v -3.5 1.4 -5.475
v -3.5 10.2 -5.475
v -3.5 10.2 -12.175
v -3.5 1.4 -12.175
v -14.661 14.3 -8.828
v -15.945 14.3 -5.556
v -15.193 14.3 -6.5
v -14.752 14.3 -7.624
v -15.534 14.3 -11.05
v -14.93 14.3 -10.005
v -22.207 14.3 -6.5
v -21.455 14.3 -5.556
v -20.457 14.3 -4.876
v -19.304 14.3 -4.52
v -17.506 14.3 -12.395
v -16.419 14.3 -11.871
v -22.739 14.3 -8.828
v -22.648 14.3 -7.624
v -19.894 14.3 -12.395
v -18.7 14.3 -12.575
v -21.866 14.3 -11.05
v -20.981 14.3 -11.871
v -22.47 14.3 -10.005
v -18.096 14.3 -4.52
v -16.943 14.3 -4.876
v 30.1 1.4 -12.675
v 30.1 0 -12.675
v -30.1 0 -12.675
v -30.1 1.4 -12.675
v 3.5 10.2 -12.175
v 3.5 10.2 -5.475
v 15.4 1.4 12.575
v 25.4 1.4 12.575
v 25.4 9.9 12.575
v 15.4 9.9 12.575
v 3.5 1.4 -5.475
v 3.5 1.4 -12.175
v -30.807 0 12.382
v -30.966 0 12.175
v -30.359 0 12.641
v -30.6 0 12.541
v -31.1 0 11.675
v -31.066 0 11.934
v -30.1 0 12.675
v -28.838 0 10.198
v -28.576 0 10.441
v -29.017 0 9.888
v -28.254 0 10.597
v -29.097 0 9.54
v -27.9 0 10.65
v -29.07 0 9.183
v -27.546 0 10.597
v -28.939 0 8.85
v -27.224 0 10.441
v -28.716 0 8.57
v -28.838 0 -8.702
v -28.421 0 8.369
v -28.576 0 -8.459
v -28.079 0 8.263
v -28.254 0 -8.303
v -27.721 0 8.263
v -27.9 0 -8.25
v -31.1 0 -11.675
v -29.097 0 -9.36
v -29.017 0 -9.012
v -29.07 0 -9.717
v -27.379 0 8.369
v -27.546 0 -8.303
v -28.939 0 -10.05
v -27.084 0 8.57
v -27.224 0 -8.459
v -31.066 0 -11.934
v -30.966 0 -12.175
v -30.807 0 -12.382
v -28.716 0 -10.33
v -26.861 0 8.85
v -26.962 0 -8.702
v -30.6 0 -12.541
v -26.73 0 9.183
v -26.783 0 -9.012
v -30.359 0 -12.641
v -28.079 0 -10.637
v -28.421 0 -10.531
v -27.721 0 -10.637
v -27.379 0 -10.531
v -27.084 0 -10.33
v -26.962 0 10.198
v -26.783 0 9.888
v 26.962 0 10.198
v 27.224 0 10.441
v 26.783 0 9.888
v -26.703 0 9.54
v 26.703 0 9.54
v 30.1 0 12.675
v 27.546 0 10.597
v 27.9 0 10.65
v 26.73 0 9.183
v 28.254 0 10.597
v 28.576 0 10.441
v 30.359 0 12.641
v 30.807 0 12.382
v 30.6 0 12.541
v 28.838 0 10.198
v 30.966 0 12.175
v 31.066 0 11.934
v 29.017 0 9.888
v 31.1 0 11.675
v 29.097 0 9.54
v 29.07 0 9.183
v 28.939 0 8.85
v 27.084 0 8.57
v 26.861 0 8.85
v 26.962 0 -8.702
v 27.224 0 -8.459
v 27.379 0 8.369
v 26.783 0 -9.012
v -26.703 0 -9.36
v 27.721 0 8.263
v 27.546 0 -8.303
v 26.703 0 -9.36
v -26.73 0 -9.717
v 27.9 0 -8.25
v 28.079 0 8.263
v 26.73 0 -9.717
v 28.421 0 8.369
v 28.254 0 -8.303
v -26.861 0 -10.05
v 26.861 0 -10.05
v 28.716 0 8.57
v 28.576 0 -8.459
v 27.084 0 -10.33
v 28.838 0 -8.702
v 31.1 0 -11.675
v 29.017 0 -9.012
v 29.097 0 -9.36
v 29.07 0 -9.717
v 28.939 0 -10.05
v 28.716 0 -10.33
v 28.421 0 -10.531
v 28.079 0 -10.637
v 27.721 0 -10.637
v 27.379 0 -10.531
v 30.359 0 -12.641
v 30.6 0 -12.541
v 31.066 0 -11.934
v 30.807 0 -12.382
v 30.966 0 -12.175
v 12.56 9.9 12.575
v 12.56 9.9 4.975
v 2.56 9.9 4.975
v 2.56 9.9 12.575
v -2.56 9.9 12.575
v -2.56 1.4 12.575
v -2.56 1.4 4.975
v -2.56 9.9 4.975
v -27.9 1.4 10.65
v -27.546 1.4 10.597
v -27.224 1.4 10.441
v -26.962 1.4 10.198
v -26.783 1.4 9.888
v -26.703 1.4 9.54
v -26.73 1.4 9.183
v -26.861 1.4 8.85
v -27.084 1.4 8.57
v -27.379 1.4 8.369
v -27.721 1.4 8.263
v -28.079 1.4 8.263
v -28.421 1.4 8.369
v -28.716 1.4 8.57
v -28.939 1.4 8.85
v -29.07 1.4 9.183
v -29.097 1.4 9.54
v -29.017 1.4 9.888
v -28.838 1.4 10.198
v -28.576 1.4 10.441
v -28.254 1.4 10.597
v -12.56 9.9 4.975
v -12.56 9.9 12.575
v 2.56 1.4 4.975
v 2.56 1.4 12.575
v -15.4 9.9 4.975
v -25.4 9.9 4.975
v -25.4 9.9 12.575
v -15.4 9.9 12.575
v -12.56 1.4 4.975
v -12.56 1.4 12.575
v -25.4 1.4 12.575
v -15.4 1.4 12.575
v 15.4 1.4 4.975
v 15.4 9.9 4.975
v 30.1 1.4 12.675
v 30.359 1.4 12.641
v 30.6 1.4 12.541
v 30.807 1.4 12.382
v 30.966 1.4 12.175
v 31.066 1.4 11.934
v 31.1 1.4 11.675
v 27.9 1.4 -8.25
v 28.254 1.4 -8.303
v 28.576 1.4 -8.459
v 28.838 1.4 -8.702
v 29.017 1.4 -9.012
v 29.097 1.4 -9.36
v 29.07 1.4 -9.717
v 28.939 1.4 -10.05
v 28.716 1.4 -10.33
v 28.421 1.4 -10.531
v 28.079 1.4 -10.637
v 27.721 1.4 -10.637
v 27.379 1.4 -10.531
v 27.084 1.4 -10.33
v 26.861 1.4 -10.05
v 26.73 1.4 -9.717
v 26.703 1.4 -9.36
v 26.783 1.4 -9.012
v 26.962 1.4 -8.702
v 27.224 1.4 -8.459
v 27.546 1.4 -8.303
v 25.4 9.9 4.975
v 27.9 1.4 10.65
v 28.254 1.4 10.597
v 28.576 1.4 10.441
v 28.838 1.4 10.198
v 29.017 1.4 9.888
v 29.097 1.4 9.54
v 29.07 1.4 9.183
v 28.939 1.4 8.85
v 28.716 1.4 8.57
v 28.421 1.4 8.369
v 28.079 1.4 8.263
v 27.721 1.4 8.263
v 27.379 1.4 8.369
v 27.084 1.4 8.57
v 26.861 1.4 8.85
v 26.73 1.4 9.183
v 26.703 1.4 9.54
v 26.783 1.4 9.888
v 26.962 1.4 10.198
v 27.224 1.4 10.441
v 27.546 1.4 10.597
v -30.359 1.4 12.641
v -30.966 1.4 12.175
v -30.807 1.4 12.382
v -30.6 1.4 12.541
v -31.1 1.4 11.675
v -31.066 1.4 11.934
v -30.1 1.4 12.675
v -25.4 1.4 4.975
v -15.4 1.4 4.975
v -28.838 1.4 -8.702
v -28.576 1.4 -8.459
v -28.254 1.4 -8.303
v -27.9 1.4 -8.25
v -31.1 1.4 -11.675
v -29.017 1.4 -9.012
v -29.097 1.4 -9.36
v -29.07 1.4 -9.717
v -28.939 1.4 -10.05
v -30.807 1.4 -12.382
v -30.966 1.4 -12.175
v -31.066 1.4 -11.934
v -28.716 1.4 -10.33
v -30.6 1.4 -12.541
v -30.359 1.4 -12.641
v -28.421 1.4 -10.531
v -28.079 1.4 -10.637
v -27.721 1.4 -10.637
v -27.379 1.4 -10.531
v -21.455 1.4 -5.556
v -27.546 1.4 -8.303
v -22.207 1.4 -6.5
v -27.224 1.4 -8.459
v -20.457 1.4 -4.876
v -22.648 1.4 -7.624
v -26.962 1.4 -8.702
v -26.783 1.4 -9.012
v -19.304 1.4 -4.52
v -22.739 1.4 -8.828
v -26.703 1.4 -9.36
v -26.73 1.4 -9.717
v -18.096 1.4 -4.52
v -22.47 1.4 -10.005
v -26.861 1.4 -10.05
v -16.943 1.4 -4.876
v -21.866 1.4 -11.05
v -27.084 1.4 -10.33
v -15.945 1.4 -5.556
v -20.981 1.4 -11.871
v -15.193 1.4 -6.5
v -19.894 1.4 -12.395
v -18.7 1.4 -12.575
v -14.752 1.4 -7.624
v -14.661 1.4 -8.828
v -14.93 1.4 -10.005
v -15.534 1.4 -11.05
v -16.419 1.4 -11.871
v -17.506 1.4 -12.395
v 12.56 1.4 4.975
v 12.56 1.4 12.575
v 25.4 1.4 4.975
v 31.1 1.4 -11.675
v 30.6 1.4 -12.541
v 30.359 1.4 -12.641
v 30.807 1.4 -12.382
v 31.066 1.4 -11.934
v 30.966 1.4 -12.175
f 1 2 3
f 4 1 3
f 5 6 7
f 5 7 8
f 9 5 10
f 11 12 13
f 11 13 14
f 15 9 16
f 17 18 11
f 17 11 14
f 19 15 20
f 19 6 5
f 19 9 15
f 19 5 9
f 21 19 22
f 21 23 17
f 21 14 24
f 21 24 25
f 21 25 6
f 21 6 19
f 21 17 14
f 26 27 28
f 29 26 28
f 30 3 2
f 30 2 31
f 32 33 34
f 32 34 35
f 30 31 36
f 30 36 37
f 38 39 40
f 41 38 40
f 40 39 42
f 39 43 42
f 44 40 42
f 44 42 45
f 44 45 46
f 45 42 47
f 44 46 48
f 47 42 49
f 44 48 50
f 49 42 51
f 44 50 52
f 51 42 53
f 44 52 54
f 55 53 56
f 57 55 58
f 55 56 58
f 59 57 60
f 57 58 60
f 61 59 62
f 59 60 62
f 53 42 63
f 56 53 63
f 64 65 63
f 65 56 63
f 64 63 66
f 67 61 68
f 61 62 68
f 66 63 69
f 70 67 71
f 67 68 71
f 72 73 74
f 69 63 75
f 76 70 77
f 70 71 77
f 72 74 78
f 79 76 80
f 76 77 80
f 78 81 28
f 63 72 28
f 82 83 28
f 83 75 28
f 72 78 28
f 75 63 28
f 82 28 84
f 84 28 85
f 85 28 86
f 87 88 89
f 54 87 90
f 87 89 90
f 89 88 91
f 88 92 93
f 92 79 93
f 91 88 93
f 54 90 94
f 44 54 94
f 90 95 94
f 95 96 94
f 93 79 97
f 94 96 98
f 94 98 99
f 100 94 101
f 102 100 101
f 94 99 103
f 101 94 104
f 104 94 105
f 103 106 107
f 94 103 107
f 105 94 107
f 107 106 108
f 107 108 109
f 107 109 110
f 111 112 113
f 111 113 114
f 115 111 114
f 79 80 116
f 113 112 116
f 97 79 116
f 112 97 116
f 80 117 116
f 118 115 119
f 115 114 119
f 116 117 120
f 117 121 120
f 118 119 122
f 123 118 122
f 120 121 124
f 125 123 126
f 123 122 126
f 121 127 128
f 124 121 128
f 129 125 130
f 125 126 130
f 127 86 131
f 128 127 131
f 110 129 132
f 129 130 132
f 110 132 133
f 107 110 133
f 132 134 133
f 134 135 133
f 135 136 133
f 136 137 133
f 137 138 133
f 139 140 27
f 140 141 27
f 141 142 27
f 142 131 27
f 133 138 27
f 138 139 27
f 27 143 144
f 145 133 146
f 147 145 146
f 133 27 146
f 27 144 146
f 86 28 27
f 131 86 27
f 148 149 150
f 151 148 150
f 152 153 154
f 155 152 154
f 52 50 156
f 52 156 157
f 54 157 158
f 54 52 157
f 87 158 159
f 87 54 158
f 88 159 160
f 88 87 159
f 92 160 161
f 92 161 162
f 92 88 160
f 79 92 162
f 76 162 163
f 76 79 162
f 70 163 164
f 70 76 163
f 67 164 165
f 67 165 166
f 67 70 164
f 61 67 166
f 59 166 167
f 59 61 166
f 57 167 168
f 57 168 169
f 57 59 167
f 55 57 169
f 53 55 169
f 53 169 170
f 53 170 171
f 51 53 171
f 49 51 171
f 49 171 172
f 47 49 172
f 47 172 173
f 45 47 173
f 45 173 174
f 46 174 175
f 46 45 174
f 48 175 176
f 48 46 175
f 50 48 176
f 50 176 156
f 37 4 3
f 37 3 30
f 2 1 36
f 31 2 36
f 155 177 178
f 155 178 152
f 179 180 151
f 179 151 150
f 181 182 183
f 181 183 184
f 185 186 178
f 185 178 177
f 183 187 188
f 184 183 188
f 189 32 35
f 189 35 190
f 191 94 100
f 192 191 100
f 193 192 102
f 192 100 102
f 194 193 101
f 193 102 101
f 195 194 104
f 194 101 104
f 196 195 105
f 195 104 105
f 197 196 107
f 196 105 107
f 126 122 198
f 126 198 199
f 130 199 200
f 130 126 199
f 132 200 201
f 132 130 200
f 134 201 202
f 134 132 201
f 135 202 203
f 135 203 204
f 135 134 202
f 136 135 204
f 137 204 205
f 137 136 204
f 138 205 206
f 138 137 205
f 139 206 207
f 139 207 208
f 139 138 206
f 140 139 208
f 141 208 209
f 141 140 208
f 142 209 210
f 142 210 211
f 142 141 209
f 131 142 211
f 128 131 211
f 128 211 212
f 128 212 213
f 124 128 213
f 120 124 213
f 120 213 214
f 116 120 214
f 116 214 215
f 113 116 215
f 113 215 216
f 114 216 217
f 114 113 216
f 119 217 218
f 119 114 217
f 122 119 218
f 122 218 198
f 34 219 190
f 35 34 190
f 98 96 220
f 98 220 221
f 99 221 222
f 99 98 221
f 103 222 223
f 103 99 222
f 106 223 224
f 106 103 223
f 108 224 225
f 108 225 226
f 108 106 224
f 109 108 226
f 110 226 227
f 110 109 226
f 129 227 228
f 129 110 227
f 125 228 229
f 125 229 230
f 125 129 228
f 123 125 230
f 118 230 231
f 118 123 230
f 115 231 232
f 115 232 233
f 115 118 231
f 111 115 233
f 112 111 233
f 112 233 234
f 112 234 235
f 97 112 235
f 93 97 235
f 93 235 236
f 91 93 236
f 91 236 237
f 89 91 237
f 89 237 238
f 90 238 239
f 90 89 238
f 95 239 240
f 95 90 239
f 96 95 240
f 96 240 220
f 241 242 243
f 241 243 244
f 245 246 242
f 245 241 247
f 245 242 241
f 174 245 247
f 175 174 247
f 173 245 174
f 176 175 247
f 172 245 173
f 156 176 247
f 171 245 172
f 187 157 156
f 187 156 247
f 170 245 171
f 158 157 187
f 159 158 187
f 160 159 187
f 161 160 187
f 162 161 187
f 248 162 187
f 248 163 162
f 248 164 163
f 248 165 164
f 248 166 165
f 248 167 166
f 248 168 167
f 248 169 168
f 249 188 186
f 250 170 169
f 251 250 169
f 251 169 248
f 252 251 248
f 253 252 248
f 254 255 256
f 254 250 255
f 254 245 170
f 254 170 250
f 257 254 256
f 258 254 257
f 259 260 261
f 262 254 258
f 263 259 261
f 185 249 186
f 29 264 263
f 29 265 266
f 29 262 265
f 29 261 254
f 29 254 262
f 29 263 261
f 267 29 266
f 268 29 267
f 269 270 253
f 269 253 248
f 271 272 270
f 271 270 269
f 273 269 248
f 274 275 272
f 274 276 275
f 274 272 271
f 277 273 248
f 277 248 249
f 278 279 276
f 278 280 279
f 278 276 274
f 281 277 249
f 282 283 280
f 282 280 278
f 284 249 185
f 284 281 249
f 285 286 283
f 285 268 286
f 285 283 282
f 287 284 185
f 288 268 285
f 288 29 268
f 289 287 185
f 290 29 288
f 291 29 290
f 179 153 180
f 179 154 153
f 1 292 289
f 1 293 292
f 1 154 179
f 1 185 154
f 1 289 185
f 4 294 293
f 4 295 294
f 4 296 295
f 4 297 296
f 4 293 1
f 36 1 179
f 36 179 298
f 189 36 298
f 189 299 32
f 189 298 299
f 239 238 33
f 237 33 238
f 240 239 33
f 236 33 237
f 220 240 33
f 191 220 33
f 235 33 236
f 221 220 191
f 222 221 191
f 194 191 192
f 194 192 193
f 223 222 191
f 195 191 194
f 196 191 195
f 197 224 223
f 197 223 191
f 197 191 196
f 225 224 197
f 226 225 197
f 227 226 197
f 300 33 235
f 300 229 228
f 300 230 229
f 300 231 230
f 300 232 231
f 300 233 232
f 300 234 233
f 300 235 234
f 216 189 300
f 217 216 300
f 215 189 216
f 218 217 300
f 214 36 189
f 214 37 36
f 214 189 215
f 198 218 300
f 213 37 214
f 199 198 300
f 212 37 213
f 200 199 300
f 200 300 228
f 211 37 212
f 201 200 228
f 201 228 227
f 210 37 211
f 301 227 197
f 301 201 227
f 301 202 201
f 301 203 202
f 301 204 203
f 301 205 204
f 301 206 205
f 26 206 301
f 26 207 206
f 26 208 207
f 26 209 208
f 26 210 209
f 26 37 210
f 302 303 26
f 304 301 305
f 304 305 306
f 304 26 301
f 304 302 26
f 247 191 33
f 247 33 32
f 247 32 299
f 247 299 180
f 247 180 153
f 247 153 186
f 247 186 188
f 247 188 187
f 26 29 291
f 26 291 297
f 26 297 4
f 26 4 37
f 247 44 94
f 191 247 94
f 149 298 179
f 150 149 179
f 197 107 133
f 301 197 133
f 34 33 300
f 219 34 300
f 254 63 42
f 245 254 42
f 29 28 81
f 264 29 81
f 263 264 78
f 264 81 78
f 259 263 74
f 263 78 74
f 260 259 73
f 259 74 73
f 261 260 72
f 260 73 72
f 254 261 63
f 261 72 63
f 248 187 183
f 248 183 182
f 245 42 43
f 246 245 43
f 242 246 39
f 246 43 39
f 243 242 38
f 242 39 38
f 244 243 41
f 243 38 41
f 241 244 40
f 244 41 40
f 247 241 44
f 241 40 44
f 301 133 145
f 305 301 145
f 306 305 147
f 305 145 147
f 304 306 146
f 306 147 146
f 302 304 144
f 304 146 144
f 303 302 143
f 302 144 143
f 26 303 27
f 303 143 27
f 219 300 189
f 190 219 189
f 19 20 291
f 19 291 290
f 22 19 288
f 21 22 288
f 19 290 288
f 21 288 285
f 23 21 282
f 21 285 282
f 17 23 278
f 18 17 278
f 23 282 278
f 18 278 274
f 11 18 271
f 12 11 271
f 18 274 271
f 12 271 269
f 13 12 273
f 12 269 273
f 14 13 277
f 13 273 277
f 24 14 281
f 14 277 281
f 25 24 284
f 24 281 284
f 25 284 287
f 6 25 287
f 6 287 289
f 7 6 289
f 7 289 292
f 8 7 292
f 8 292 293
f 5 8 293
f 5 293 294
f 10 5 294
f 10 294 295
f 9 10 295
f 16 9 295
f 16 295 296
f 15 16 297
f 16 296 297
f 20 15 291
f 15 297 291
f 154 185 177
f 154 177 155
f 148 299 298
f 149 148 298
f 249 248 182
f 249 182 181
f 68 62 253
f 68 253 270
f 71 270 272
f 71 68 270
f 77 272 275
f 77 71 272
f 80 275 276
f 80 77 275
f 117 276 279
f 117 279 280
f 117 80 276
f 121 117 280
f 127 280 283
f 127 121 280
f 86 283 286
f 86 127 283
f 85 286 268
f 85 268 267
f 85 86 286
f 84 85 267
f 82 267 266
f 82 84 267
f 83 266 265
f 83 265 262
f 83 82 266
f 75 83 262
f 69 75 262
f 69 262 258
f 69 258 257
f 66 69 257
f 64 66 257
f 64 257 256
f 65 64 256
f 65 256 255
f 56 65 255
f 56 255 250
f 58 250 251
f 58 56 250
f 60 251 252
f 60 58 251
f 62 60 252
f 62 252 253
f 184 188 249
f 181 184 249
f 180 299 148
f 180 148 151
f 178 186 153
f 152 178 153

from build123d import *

# Parameters (mm, degrees)
SKETCH1_R           = 1.2
BOSS_EXTRUDE1_DEPTH = 1.4
SKETCH2_W           = 7
SKETCH2_H           = 6.7
BOSS_EXTRUDE2_DEPTH = 8.8
SKETCH3_W           = 10
SKETCH3_H           = 7.6
BOSS_EXTRUDE3_DEPTH = 8.5
SKETCH4_R           = 4.05
BOSS_EXTRUDE4_DEPTH = 12.9


with BuildPart() as part:
    # Sketch1 → Boss-Extrude1 (new body)
    with BuildSketch(Plane(origin=(0, 0, 0), x_dir=(1, 0, 0), z_dir=(0, 1, 0))):
        with BuildLine():
            Line((-30.1, -12.675), (30.1, -12.675))
            ThreePointArc((30.1, -12.675), (30.807106781, -12.382106781), (31.1, -11.675))
            Line((31.1, -11.675), (31.1, 11.675))
            ThreePointArc((31.1, 11.675), (30.807106781, 12.382106781), (30.1, 12.675))
            Line((30.1, 12.675), (-30.1, 12.675))
            ThreePointArc((-30.1, 12.675), (-30.807106781, 12.382106781), (-31.1, 11.675))
            Line((-31.1, 11.675), (-31.1, -11.675))
            ThreePointArc((-31.1, -11.675), (-30.807106781, -12.382106781), (-30.1, -12.675))
        make_face()
        with Locations(Location((-27.9, 9.45, 0), (0, 0, 270))):
            Circle(SKETCH1_R, mode=Mode.SUBTRACT)
        with Locations(Location((-27.9, -9.45, 0), (0, 0, 270))):
            Circle(SKETCH1_R, mode=Mode.SUBTRACT)
        with Locations(Location((27.9, -9.45, 0), (0, 0, 270))):
            Circle(SKETCH1_R, mode=Mode.SUBTRACT)
        with Locations(Location((27.9, 9.45, 0), (0, 0, 270))):
            Circle(SKETCH1_R, mode=Mode.SUBTRACT)
    extrude(amount=BOSS_EXTRUDE1_DEPTH)

    # Sketch2 → Boss-Extrude2 (add)
    with BuildSketch(Plane(origin=(0, 1.4, 0), x_dir=(1, 0, 0), z_dir=(0, 1, 0))):
        with Locations((0, 8.825)):
            Rectangle(SKETCH2_W, SKETCH2_H)
    extrude(amount=BOSS_EXTRUDE2_DEPTH)

    # Sketch3 → Boss-Extrude3 (add)
    with BuildSketch(Plane(origin=(0, 1.4, 0), x_dir=(1, 0, 0), z_dir=(0, 1, 0))):
        with Locations((-20.4, -8.775)):
            Rectangle(SKETCH3_W, SKETCH3_H)
        with Locations((-7.56, -8.775)):
            Rectangle(SKETCH3_W, SKETCH3_H)
    boss_extrude3 = extrude(amount=BOSS_EXTRUDE3_DEPTH)

    # Mirror1: Boss-Extrude3 across plane
    add(boss_extrude3.mirror(Plane(origin=(0, 0, 0), x_dir=(0, 0, 1), z_dir=(1, 0, 0))))

    # Sketch4 → Boss-Extrude4 (add)
    with BuildSketch(Plane(origin=(0, 1.4, 0), x_dir=(1, 0, 0), z_dir=(0, 1, 0))):
        with Locations(Location((-18.7, 8.525, 0), (0, 0, 90))):
            Circle(SKETCH4_R)
    extrude(amount=BOSS_EXTRUDE4_DEPTH)


solid = part.part
